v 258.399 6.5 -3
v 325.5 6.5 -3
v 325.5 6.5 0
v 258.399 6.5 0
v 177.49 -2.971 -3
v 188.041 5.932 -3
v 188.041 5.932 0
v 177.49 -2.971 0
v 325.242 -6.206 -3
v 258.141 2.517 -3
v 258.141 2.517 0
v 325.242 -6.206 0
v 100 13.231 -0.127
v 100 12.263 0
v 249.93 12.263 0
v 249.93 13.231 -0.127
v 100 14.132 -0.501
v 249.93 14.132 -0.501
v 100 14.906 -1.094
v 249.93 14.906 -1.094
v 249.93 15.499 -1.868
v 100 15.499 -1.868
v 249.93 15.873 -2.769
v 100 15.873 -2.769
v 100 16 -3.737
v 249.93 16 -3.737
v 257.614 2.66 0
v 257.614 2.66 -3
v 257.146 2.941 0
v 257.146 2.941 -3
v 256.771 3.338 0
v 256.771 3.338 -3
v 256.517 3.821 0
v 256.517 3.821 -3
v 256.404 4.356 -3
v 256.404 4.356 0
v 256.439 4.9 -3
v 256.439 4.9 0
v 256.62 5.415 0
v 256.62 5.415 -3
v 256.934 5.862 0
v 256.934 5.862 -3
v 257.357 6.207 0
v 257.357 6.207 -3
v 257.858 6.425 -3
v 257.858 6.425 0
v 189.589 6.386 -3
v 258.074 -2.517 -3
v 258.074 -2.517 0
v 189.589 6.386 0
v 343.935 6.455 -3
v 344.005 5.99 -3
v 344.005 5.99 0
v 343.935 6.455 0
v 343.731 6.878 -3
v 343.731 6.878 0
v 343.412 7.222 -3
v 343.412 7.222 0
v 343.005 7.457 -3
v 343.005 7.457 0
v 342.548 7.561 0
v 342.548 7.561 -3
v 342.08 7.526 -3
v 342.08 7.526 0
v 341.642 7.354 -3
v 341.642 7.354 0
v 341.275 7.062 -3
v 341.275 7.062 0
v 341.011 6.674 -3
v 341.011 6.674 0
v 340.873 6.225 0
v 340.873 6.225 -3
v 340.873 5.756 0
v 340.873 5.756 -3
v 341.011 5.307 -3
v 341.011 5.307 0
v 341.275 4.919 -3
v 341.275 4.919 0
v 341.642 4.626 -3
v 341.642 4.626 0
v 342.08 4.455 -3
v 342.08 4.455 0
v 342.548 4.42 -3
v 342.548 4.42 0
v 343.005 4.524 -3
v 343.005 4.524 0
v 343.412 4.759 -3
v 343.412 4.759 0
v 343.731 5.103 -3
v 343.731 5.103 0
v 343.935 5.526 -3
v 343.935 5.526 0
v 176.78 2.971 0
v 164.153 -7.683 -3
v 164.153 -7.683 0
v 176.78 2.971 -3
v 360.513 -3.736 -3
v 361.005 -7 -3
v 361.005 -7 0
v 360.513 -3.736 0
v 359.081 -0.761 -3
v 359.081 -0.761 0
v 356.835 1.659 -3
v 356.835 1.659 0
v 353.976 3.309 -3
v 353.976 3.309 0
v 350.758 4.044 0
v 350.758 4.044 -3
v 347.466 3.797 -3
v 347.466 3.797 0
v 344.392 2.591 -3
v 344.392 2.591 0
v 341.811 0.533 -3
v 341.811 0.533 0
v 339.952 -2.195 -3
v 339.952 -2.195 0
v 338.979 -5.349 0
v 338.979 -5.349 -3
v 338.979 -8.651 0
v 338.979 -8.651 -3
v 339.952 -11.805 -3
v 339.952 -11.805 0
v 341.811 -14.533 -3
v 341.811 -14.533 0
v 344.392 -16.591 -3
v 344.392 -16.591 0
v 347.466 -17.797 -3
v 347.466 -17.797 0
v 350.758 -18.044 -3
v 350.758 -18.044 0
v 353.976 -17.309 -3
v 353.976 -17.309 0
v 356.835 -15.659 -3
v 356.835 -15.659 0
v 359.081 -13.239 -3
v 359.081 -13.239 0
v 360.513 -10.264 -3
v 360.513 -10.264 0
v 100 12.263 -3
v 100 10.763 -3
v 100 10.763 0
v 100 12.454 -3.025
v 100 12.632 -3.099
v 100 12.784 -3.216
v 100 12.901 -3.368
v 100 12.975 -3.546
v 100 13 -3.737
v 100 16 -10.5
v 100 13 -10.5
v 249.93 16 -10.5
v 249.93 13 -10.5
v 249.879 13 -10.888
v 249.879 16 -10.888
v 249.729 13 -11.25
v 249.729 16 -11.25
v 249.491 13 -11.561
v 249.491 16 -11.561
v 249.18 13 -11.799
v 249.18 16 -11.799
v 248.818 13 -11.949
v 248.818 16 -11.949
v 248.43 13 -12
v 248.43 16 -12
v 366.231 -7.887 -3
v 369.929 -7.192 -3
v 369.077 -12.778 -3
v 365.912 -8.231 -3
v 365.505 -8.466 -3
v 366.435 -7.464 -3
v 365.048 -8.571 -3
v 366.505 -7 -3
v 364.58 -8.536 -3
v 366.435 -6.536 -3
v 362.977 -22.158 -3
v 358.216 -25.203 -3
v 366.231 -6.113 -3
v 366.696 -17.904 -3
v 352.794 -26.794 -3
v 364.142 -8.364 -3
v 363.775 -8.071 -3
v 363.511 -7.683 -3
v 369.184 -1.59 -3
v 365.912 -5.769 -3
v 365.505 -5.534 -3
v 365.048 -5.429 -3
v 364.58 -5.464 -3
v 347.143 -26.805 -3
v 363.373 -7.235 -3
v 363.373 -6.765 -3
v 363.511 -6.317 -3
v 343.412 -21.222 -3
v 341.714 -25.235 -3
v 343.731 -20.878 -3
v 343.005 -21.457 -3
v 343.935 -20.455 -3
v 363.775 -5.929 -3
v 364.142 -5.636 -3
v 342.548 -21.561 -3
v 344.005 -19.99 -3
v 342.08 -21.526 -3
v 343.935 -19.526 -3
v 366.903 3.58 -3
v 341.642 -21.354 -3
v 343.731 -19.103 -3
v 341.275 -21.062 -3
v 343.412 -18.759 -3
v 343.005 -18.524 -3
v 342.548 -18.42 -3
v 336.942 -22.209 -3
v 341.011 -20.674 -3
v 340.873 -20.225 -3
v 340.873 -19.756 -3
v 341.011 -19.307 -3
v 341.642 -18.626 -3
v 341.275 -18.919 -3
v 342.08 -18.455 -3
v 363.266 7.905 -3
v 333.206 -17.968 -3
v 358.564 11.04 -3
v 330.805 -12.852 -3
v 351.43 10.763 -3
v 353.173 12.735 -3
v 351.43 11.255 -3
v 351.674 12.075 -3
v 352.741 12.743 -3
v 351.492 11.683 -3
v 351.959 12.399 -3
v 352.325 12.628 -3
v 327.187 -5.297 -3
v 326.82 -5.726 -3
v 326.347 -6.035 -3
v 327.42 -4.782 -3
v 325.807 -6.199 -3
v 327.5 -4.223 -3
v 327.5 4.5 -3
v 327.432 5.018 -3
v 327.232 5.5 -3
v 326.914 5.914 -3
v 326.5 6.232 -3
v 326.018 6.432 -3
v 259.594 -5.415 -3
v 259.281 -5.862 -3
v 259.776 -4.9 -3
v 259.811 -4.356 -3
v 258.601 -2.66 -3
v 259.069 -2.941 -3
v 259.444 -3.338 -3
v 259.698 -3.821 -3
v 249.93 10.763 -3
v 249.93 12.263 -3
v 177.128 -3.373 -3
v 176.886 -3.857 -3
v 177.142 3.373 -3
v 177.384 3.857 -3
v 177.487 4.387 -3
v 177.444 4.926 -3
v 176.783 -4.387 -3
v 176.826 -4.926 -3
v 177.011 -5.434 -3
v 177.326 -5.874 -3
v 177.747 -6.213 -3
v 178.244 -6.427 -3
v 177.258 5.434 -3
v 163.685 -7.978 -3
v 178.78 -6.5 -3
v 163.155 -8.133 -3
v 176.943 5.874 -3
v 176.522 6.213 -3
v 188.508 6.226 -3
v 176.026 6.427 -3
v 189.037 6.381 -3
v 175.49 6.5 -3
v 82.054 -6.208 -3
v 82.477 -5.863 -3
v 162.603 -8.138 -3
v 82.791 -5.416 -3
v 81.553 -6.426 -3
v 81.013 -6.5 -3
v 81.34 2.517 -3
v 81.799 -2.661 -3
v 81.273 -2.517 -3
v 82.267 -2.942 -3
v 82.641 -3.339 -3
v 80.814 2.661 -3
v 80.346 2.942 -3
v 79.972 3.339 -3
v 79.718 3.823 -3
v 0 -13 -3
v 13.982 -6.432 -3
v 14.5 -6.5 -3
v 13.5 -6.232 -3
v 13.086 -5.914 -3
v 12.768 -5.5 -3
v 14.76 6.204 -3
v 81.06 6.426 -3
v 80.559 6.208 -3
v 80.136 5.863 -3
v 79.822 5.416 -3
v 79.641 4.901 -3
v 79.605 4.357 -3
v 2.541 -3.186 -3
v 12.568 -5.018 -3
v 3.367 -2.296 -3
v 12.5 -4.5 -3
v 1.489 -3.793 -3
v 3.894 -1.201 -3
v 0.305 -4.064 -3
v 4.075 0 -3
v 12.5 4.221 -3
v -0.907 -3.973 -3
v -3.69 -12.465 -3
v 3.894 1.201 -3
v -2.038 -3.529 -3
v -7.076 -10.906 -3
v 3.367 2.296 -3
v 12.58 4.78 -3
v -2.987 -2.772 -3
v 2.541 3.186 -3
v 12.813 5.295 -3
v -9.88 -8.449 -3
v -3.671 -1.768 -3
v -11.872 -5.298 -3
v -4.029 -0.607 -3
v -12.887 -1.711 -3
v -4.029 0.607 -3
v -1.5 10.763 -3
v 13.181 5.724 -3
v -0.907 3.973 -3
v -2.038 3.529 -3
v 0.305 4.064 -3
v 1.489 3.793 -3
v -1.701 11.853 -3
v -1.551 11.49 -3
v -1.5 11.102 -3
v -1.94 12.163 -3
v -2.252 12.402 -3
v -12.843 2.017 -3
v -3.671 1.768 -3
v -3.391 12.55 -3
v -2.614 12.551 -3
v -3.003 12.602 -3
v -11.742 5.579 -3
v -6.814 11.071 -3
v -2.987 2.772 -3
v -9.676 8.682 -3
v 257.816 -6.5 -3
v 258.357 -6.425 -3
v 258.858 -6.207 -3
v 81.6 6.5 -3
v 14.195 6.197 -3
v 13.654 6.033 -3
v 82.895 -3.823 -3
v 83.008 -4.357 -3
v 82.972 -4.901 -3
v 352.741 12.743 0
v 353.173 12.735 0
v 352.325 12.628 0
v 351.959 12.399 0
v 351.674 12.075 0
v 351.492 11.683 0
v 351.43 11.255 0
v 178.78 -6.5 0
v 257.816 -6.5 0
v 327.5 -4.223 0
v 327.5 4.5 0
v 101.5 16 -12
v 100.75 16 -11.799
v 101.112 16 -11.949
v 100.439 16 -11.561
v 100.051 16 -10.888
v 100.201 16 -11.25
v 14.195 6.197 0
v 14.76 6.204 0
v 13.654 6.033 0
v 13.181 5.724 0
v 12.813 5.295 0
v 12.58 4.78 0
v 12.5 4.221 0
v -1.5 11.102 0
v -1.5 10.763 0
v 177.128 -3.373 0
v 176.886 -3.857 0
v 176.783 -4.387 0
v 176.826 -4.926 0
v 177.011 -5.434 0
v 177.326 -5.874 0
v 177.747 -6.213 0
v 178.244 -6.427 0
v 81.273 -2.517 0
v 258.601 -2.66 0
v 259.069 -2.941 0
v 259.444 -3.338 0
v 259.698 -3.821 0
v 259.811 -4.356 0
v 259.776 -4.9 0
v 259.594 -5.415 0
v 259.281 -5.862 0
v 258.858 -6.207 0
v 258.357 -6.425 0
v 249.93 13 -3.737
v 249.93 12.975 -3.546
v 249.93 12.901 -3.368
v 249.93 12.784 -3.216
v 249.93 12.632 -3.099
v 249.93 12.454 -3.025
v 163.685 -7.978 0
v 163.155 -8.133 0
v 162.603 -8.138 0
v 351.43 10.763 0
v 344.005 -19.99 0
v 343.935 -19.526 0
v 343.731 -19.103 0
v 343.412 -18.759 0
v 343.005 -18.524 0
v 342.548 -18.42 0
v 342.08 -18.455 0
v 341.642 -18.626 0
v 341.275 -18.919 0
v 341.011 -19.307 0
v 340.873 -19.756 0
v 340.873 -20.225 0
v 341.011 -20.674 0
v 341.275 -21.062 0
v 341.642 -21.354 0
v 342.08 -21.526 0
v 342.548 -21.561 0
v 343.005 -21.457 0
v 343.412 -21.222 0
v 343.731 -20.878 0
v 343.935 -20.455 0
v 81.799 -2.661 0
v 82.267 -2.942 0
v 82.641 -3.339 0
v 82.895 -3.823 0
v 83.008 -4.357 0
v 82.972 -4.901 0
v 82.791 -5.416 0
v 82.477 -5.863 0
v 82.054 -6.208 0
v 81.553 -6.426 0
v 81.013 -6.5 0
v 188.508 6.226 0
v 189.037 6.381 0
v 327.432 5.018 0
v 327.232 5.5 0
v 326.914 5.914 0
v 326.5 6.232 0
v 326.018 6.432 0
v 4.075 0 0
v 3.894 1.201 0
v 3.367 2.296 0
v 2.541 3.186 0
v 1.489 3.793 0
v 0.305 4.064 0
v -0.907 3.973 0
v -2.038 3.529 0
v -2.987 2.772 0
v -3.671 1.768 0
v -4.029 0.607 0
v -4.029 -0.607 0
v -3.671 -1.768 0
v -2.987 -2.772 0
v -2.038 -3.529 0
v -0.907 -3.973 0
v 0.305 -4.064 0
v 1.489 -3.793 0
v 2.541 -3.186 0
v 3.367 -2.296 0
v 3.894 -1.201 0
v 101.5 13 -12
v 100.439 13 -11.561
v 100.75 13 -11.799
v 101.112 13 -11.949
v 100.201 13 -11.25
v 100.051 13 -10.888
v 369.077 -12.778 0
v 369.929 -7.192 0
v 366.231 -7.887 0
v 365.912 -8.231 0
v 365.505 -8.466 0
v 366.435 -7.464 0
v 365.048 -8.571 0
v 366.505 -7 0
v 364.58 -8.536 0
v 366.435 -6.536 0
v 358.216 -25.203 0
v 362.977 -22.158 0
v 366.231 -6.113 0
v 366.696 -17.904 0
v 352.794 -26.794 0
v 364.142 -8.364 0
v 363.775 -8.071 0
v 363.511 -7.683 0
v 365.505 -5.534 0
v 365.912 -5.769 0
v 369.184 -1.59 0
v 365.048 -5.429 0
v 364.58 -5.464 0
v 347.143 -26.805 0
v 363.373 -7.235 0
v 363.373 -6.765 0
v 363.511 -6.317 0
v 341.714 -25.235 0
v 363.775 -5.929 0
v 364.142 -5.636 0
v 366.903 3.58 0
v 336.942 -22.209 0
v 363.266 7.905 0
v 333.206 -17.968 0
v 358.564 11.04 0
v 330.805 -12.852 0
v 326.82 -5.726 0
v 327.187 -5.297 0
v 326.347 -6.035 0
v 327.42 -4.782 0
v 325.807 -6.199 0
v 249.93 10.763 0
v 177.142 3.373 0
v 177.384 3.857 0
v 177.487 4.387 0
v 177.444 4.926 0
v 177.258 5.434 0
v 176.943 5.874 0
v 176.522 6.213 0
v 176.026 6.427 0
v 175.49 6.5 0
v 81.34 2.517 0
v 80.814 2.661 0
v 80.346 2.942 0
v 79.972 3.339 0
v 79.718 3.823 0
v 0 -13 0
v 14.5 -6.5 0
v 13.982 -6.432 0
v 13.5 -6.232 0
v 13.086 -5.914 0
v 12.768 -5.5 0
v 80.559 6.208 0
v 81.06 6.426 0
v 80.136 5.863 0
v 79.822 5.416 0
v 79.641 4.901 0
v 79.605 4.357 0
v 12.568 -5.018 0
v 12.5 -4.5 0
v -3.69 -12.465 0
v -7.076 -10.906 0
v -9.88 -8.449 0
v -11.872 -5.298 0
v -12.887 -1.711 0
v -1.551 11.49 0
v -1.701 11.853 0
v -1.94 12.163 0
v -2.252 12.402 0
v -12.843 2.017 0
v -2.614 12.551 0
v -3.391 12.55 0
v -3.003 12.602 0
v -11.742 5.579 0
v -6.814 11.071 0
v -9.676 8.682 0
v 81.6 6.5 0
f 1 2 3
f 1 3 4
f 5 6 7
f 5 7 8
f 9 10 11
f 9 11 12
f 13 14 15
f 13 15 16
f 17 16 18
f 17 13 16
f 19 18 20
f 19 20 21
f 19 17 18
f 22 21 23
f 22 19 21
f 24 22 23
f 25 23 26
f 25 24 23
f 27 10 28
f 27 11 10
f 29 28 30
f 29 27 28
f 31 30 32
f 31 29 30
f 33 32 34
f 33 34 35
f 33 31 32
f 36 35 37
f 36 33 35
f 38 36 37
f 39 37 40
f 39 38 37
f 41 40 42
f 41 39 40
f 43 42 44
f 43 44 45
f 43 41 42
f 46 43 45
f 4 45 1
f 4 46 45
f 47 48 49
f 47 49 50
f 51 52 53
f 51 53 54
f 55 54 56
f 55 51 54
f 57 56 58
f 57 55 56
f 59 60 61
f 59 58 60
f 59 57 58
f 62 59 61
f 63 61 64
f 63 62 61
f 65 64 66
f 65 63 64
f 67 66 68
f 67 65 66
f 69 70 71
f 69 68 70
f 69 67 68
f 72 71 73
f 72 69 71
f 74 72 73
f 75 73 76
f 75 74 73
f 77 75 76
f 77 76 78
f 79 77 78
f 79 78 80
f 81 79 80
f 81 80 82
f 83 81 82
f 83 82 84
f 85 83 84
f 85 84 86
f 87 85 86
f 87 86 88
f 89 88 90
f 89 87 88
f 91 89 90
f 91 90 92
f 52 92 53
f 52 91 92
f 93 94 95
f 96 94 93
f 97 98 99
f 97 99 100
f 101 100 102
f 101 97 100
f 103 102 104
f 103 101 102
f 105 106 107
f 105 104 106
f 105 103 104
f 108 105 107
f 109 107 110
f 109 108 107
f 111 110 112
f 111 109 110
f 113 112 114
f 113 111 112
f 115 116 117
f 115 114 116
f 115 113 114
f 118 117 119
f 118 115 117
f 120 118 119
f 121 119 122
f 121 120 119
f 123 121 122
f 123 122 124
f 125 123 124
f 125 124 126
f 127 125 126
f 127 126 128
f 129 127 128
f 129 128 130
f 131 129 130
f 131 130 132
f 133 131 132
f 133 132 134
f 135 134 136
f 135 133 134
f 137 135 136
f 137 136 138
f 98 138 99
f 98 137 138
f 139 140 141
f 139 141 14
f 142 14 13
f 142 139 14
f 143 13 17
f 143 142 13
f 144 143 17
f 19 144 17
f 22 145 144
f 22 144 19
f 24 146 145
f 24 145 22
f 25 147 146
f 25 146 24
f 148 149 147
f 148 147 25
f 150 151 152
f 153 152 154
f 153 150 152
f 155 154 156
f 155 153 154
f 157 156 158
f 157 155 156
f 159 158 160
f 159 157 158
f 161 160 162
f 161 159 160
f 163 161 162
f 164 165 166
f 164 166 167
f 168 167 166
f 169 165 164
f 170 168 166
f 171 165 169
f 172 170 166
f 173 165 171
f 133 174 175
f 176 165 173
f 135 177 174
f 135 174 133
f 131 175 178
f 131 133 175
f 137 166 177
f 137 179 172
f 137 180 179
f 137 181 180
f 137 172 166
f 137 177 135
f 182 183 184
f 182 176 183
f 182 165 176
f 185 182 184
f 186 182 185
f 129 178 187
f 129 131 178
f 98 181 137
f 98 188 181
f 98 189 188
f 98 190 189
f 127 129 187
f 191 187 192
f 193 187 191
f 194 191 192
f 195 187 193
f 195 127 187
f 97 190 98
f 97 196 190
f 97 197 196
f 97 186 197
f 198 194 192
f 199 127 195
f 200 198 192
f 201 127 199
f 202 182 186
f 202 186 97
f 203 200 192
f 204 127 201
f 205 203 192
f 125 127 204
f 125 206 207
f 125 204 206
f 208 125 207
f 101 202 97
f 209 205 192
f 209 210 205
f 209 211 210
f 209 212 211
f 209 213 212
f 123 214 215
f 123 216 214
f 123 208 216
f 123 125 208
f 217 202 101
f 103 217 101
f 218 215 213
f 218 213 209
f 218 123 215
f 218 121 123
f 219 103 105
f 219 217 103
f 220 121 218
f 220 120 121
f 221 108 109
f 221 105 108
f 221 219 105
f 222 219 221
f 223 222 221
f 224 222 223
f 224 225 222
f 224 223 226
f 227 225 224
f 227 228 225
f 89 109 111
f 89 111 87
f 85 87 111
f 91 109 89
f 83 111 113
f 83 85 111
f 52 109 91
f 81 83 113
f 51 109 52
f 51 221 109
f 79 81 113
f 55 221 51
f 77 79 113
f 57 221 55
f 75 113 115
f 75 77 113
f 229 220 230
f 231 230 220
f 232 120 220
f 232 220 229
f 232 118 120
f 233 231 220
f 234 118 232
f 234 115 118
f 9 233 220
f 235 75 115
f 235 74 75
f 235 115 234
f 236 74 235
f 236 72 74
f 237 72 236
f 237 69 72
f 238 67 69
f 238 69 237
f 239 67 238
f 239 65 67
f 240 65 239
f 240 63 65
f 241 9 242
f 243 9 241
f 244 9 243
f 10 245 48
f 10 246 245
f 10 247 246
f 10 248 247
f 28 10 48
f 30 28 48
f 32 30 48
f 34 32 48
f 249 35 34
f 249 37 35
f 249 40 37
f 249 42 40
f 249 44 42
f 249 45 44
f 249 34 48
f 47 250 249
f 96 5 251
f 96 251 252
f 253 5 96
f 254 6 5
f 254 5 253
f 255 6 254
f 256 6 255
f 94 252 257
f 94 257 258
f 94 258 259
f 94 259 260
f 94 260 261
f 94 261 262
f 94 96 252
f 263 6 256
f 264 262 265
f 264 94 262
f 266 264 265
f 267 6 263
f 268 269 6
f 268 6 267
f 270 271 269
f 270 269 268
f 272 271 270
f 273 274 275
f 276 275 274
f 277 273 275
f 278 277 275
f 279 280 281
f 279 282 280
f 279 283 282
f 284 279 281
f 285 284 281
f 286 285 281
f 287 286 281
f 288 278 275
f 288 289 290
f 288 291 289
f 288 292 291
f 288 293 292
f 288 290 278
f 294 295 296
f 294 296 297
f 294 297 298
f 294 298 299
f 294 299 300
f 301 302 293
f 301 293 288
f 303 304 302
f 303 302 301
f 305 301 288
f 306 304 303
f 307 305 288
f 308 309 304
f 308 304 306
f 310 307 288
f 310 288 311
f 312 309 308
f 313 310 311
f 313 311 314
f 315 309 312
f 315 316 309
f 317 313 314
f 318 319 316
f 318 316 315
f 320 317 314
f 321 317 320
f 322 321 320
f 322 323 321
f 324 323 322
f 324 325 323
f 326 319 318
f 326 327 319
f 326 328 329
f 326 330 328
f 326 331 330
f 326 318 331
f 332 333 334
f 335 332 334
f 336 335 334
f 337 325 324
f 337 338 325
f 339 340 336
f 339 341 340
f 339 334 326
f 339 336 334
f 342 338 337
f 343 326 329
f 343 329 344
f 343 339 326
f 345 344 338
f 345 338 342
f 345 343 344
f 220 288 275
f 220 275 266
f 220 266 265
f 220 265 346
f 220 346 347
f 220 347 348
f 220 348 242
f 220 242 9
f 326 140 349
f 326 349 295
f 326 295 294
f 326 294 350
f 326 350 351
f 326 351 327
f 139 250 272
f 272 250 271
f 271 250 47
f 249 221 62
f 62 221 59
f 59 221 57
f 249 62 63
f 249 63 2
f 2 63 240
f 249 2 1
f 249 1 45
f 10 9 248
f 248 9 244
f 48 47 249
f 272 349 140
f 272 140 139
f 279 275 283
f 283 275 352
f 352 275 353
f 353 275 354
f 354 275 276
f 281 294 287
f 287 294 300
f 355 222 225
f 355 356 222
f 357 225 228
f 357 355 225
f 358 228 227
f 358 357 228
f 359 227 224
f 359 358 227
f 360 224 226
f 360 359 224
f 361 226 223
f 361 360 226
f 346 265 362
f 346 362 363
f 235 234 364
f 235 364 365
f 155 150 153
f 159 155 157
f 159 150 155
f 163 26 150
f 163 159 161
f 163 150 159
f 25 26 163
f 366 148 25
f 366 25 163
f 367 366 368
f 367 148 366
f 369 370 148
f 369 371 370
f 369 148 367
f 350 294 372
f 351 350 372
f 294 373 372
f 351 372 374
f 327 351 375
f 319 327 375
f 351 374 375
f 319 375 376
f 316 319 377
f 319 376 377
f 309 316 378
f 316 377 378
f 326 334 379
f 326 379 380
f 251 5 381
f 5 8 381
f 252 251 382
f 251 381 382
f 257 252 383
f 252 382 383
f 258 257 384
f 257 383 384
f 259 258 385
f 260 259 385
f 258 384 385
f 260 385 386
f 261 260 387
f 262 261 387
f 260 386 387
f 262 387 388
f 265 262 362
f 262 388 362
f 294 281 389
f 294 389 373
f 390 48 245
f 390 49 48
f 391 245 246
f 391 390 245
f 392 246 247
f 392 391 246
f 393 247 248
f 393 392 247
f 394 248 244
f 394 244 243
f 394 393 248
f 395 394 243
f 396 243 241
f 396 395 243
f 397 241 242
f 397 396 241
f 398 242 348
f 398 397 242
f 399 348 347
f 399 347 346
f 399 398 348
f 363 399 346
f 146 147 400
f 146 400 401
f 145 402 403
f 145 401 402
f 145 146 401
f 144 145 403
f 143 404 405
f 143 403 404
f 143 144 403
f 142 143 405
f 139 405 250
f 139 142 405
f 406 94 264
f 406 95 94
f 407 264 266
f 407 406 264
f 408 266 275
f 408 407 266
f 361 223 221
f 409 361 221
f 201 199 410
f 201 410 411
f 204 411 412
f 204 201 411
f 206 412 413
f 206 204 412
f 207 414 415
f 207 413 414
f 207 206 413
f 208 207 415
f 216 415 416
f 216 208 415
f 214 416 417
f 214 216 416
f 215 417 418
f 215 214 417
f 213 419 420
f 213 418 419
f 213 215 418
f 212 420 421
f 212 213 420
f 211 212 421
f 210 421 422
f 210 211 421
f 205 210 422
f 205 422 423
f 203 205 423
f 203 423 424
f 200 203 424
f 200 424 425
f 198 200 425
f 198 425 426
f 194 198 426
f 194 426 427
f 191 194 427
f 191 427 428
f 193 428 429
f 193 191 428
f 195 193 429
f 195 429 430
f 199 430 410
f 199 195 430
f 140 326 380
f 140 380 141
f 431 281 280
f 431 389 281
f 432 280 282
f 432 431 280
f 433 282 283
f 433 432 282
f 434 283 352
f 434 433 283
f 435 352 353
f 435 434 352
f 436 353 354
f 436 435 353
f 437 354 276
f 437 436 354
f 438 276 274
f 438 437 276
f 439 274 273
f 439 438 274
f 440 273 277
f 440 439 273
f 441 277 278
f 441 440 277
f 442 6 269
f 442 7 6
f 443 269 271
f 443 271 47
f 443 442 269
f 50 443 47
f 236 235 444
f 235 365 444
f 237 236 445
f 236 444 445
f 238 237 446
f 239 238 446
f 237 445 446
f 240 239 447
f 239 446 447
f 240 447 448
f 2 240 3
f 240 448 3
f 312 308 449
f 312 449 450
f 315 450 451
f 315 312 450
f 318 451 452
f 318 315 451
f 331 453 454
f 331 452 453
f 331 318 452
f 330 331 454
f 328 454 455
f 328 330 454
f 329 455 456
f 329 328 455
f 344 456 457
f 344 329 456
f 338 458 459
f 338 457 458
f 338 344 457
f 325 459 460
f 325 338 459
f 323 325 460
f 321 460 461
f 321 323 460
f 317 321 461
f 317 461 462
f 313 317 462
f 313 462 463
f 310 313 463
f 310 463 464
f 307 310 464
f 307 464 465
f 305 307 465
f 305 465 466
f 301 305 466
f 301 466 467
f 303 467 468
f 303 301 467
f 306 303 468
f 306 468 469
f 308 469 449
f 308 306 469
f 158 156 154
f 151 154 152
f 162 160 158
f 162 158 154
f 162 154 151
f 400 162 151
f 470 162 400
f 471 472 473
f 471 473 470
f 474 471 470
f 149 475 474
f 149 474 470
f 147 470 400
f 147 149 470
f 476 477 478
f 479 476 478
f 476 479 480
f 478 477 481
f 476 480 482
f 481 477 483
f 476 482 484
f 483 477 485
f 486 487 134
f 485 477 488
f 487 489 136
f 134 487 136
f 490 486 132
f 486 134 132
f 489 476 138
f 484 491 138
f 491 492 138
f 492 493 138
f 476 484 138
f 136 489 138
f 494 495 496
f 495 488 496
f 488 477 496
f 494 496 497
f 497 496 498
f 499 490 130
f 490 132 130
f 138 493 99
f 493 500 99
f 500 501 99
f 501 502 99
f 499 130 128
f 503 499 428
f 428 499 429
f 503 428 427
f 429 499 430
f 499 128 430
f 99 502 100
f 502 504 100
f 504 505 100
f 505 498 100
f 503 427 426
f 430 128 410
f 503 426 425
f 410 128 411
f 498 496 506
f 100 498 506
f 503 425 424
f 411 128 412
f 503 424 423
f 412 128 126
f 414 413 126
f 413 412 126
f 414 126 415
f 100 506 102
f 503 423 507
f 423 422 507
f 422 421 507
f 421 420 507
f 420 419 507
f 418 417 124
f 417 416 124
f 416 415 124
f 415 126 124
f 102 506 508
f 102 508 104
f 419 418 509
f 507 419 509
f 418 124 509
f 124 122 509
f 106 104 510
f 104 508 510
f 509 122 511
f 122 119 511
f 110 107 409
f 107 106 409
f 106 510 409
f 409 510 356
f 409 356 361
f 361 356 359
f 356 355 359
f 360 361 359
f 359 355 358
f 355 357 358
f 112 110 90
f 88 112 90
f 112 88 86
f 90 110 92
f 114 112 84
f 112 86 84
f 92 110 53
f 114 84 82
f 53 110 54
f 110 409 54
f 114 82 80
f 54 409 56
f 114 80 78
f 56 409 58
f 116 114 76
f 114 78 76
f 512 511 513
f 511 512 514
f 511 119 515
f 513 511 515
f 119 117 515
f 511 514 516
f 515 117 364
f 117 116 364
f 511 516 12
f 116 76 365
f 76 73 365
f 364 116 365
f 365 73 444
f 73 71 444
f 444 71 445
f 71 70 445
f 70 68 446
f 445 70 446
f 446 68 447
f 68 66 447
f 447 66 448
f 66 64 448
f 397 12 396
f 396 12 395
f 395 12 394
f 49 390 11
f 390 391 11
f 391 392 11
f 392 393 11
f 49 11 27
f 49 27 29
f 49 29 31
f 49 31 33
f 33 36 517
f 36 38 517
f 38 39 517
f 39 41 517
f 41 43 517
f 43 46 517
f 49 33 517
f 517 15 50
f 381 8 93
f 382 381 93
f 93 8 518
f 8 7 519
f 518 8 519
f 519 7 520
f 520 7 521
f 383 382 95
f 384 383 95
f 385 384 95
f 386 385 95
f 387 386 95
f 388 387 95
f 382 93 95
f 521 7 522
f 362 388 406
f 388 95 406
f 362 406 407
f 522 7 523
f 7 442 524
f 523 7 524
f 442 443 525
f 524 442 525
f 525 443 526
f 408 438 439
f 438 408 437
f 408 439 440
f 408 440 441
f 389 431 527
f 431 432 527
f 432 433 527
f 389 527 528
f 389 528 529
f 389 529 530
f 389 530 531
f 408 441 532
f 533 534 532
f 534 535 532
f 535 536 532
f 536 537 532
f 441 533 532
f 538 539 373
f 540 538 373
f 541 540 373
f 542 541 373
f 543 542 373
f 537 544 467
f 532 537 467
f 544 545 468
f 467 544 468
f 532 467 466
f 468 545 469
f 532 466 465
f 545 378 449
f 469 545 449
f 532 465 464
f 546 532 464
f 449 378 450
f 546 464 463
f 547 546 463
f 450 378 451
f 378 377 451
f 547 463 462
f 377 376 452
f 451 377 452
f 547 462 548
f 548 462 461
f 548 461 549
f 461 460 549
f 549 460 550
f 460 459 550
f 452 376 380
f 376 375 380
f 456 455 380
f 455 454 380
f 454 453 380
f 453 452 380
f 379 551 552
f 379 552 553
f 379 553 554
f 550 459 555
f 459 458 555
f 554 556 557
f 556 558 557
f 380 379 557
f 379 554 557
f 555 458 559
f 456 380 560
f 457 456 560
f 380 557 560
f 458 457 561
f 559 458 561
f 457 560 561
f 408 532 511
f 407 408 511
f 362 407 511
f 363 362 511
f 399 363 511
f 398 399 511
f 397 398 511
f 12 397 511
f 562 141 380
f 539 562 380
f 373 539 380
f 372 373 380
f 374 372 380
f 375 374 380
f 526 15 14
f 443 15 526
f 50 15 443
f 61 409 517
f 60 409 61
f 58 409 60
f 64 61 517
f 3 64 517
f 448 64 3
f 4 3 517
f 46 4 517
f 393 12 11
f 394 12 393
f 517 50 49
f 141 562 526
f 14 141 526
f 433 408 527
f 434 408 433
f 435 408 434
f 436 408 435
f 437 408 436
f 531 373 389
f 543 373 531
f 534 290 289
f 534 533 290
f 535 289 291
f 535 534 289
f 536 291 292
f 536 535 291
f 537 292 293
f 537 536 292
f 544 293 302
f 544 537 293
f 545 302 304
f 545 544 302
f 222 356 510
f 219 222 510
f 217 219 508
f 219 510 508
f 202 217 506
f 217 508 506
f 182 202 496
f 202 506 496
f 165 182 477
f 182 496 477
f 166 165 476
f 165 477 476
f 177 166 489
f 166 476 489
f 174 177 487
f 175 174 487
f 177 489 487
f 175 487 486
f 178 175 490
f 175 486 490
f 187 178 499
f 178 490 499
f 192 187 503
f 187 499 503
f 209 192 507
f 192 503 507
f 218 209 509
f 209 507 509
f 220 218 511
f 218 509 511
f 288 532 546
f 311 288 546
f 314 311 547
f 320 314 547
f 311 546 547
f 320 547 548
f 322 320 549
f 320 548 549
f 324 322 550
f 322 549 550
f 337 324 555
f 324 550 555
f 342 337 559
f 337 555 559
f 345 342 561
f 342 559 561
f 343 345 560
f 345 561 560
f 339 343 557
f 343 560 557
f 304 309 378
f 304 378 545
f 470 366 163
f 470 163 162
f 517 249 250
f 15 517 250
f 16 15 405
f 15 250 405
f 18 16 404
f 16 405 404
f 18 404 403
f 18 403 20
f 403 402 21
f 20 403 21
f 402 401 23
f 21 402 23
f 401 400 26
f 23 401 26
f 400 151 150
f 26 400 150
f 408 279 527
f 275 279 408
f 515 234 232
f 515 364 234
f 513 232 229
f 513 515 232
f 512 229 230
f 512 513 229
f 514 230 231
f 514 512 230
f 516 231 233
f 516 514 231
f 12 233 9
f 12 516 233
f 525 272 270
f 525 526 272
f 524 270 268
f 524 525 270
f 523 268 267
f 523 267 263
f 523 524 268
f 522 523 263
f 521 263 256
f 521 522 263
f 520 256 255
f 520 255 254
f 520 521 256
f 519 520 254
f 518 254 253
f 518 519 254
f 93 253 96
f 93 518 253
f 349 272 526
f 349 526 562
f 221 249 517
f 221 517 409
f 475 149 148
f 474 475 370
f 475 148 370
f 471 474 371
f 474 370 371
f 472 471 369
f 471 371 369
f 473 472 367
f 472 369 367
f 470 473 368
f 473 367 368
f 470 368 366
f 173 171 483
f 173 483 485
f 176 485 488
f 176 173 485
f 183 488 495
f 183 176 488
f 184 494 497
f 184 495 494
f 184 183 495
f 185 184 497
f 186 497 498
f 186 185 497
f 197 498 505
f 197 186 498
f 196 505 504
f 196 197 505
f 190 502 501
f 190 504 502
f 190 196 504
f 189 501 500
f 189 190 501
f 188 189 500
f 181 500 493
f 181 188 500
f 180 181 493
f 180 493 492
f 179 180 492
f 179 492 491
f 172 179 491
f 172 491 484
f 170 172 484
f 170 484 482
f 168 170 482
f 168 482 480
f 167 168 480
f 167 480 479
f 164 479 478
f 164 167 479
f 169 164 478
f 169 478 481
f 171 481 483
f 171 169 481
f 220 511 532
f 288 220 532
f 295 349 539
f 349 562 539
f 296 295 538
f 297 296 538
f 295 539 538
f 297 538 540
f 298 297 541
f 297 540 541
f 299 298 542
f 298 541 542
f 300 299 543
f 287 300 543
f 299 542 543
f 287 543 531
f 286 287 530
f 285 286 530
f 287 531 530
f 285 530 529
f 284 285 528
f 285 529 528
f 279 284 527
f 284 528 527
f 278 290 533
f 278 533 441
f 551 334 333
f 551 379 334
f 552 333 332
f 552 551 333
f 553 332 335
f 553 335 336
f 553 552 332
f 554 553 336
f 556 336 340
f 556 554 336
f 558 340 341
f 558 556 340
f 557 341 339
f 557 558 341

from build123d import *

# Parameters (mm, degrees)
BASE_FLANGE1_DEPTH            = 3
EDGE_FLANGE2_STRIP_W          = 13.4732
EDGE_FLANGE2_STRIP_H          = 3
EDGE_FLANGE2_STRIP_CUT_DEPTH  = 349.93
EDGE_FLANGE2_RELIEF_W         = 14.9732
EDGE_FLANGE2_RELIEF_H         = 1.5
EDGE_FLANGE2_RELIEF_CUT_DEPTH = 3
EDGE_FLANGE2_DEPTH            = 349.93
CUT_EXTRUDE1_DEPTH            = 372.108077115
CUT_EXTRUDE1_DEPTH_BACK       = 372.108077115
SKETCH22_R                    = 4.075
SKETCH22_R_2                  = 11.075
SKETCH22_R_3                  = 1.575
CUT_EXTRUDE2_DEPTH            = 372.108077115
CUT_EXTRUDE2_DEPTH_BACK       = 372.108077115
FILLET1_R                     = 2
CUT_EXTRUDE3_DEPTH            = 372.108077115
CUT_EXTRUDE3_DEPTH_BACK       = 372.108077115
SKETCH24_W                    = 100
SKETCH24_H                    = 5.2366
FILLET2_R                     = 1.5


# Sheet-metal steps are written as plain solids
with BuildPart() as part:
    # Sketch1 → Base-Flange1 (new body)
    with BuildSketch(Plane.XY):
        with BuildLine():
            Line((0, 13), (349.93, 13))
            ThreePointArc((349.93, 13), (366.008670386, -18.89438349), (330.805412842, -12.852364139))
            Line((330.805412842, -12.852364139), (0, -13))
            ThreePointArc((0, -13), (-13, 0), (0, 13))
        make_face()
    extrude(amount=-BASE_FLANGE1_DEPTH)

    # Edge-Flange2 strip (across the edge) → Edge-Flange2 strip cut (cut)
    with BuildSketch(Plane(origin=(0, 13, -3), x_dir=(0, -1, 0), z_dir=(1, 0, 0))):
        with Locations((-6, -1.5)):
            Rectangle(EDGE_FLANGE2_STRIP_W, EDGE_FLANGE2_STRIP_H)
    extrude(amount=EDGE_FLANGE2_STRIP_CUT_DEPTH, mode=Mode.SUBTRACT)

    # Edge-Flange2 relief (on the sheet) → Edge-Flange2 relief cut (cut)
    with BuildSketch(Plane(origin=(0, 12.2634, -3), x_dir=(0, -1, 0), z_dir=(0, 0, -1))):
        with Locations((-5.9866, 0.75)):
            Rectangle(EDGE_FLANGE2_RELIEF_W, EDGE_FLANGE2_RELIEF_H)
        with Locations((-5.9866, -350.68)):
            Rectangle(EDGE_FLANGE2_RELIEF_W, EDGE_FLANGE2_RELIEF_H)
    extrude(amount=-EDGE_FLANGE2_RELIEF_CUT_DEPTH, mode=Mode.SUBTRACT)

    # Edge-Flange2 section (across the edge) → Edge-Flange2 (add)
    with BuildSketch(Plane(origin=(0, 13, -3), x_dir=(0, -1, 0), z_dir=(1, 0, 0))):
        with BuildLine():
            Line((-3, 0.7366), (-3, 9))
            Line((-3, 9), (0, 9))
            Line((0, 9), (0, 0.7366))
            ThreePointArc((0, 0.7366), (0.215745145, 0.215745145), (0.7366, 0))
            Line((0.7366, 0), (0.7366, -3))
            ThreePointArc((0.7366, -3), (-1.905575199, -1.905575199), (-3, 0.7366))
        make_face()
    extrude(amount=EDGE_FLANGE2_DEPTH)

    # Sketch22 → Cut-Extrude1 (cut, two sides: drawn at the far end of the back side and taken through both)
    with BuildSketch(Plane.XY.offset(-CUT_EXTRUDE1_DEPTH_BACK)):
        Circle(SKETCH22_R)
        with Locations((349.93, -7)):
            Circle(SKETCH22_R_2)
        with Locations((364.93, -7)):
            Circle(SKETCH22_R_3)
        with Locations((342.43, 5.990381057)):
            Circle(SKETCH22_R_3)
        with Locations((342.43, -19.990381057)):
            Circle(SKETCH22_R_3)
    extrude(amount=CUT_EXTRUDE1_DEPTH + CUT_EXTRUDE1_DEPTH_BACK, mode=Mode.SUBTRACT)

    # Sketch23 → Cut-Extrude2 (cut, two sides: drawn at the far end of the back side and taken through both)
    with BuildSketch(Plane.XY.offset(-CUT_EXTRUDE2_DEPTH_BACK)):
        Polygon((12.5, 6.5), (12.5, -6.5), (111.651399385, -6.5), align=None)
        Polygon((327.5, 6.5), (227.5, 6.5), (327.5, -6.5), align=None)
        Polygon((50.961538462, 6.5), (163.478075869, -8.252338296), (180.961538462, 6.5), align=None)
        Polygon((173.308112114, -6.5), (288.714823182, -6.5), (188.714823182, 6.5), align=None)
    extrude(amount=CUT_EXTRUDE2_DEPTH + CUT_EXTRUDE2_DEPTH_BACK, mode=Mode.SUBTRACT)

    # Fillet1
    fillet1_edges = [part.edges().sort_by_distance(p)[0] for p in [
        (12.5, 6.5, -1.5),
        (288.714823182, -6.5, -1.5),
        (173.308112114, -6.5, -1.5),
        (188.714823182, 6.5, -1.5),
        (163.478075869, -8.252338296, -1.5),
        (50.961538462, 6.5, -1.5),
        (180.961538462, 6.5, -1.5),
        (227.5, 6.5, -1.5),
        (0, 14.5, -12),
        (349.93, 14.5, -12),
        (327.5, -6.5, -1.5),
        (327.5, 6.5, -1.5),
        (111.651399385, -6.5, -1.5),
        (12.5, -6.5, -1.5),
    ]]
    fillet(fillet1_edges, radius=FILLET1_R)

    # Sketch24 → Cut-Extrude3 (cut, two sides: drawn at the far end of the back side and taken through both)
    with BuildSketch(Plane.XY.offset(-CUT_EXTRUDE3_DEPTH_BACK)):
        with Locations((50, 13.3817)):
            Rectangle(SKETCH24_W, SKETCH24_H)
        with Locations((299.93, 13.3817)):
            Rectangle(SKETCH24_W, SKETCH24_H)
    extrude(amount=CUT_EXTRUDE3_DEPTH + CUT_EXTRUDE3_DEPTH_BACK, mode=Mode.SUBTRACT)

    # Fillet2
    fillet2_edges = [part.edges().sort_by_distance(p)[0] for p in [
        (351.43, 12.943670675, -1.5),
        (-1.5, 12.91317157, -1.5),
        (100, 14.5, -12),
        (249.93, 14.5, -12),
    ]]
    fillet(fillet2_edges, radius=FILLET2_R)


solid = part.part
